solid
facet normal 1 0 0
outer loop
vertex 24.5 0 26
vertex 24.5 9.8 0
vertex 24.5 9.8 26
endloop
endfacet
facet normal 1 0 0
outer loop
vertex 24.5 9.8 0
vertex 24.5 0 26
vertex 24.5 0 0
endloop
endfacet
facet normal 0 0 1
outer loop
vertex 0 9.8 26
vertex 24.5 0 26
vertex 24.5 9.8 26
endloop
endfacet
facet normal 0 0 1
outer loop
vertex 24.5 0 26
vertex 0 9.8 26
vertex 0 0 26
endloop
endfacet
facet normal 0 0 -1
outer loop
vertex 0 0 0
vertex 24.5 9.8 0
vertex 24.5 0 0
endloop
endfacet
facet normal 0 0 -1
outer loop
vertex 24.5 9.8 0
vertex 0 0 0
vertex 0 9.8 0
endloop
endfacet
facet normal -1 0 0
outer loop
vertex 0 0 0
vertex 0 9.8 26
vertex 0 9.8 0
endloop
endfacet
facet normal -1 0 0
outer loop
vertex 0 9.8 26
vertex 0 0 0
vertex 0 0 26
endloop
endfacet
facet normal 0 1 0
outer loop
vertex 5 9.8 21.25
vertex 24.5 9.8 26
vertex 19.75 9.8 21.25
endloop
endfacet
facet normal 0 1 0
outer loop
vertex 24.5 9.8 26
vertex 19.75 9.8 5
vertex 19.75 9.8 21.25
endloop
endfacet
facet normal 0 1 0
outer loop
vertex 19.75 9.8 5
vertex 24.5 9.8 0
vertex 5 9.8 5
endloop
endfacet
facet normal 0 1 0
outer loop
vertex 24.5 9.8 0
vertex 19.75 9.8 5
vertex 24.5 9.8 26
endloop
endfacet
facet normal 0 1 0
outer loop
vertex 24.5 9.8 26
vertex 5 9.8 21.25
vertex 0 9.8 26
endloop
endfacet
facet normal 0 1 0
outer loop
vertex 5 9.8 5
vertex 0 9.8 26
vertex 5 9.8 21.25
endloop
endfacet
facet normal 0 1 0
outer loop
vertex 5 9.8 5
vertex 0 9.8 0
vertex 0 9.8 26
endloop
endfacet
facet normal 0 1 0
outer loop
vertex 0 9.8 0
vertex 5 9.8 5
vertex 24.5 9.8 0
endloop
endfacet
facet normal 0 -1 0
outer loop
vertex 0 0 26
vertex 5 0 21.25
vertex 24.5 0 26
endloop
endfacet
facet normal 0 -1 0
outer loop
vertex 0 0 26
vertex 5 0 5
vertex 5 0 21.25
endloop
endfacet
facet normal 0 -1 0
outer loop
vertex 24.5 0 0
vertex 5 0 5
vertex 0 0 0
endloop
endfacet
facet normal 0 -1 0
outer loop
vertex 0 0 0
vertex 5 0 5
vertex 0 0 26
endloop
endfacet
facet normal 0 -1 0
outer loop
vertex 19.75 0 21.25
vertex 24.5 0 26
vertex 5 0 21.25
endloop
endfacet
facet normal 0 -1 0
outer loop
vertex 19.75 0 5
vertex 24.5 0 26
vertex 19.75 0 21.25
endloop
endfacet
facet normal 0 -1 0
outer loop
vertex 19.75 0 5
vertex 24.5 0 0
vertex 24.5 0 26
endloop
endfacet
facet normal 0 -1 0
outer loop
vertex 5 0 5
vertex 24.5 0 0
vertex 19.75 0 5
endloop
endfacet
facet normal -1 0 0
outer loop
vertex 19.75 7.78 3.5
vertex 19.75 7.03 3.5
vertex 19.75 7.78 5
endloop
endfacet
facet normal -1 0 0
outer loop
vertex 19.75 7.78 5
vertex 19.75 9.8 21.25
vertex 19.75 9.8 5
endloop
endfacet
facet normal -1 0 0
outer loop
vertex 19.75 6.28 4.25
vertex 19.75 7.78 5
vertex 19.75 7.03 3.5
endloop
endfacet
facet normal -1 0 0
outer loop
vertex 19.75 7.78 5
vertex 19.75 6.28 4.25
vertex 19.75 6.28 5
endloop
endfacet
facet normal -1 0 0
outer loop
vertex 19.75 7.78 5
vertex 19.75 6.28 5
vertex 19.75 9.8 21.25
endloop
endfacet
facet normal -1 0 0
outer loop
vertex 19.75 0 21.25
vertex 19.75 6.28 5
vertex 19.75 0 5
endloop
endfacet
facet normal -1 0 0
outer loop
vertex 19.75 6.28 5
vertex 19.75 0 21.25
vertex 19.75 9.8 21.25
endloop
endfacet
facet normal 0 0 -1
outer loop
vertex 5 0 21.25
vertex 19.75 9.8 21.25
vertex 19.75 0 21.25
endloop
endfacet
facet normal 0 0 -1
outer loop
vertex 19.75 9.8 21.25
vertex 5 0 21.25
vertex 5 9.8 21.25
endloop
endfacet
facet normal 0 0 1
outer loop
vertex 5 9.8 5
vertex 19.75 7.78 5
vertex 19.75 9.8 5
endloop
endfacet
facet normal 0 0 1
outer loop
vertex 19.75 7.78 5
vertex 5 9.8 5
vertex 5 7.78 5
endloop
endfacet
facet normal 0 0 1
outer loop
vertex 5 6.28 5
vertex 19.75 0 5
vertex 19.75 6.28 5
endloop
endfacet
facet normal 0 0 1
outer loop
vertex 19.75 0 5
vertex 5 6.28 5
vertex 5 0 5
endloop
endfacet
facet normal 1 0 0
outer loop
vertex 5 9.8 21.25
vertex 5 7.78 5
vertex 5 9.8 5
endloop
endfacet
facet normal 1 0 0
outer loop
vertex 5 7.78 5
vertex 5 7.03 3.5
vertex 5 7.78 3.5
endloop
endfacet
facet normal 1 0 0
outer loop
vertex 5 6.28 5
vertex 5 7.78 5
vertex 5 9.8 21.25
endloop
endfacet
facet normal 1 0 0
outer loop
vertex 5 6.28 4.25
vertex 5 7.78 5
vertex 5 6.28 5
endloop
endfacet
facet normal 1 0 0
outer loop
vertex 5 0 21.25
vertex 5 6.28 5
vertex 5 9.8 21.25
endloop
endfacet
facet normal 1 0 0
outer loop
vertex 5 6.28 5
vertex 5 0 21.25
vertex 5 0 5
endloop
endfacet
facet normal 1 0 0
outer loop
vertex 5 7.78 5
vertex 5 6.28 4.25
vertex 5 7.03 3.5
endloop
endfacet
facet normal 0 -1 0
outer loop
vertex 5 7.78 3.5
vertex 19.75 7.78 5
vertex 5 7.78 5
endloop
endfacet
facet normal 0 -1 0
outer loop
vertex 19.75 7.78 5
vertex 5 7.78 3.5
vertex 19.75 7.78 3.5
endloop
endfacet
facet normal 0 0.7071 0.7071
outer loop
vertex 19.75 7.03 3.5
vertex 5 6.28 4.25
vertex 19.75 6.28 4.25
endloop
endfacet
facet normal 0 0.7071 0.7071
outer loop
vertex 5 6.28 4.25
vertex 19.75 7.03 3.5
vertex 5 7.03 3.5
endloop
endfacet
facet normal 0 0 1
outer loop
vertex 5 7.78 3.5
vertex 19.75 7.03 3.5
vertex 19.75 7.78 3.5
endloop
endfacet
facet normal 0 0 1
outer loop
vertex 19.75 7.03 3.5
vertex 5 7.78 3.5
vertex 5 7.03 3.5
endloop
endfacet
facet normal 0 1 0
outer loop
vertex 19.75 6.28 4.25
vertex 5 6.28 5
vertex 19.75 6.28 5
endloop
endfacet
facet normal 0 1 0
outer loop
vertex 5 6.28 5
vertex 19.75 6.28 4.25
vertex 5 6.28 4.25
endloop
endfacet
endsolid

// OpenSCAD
// all dimensions are in millimeters

// major dimension for keystone hole, width
keystone_width = 14.5;
// major dimension for keystone hole, height
keystone_height = 16;

// clearance around hole
boss_clearance = 0.25;
// margin aroudn keystone hole
boss_margin = 5;
boss_inner_width = keystone_width + boss_clearance;
boss_inner_height = keystone_height + boss_clearance;
boss_outer_width = keystone_width + boss_margin * 2;
boss_outer_height = keystone_height + boss_margin * 2;
// depth of the solid frame around the keystone hole
boss_depth = 9.8;

// major dimension of fixed tab as viewed from side of connector (square with a corner cut off)
fixed_tab_size = 1.5;
fixed_tab_depth_from_panel_face = 6.28;

module boss() {
    module basic_frame() {
        color([1, 1, 1])
            difference() {
                cube([boss_outer_width, boss_depth, boss_outer_height]);
                translate([boss_margin, 0, boss_margin])
                    cube([boss_inner_width, boss_depth, boss_inner_height]);
            }
    }

    module clearance_for_fixed_tab() {
        translate([boss_margin, fixed_tab_depth_from_panel_face, boss_margin])
        rotate([0, 90, 0])
        linear_extrude(height=boss_inner_width)
        // polygon drawn as viewed from side of keystone connector (triangular-ish face)
        polygon(points=[[0, 0], [0, fixed_tab_size], [fixed_tab_size, fixed_tab_size], [fixed_tab_size, fixed_tab_size / 2], [fixed_tab_size / 2, 0]]);
    }

    module clearances() {
        clearance_for_fixed_tab();
    }

    difference() {
        basic_frame();
        clearances();
    }
}

module keystone() {
    boss();
}

keystone();
